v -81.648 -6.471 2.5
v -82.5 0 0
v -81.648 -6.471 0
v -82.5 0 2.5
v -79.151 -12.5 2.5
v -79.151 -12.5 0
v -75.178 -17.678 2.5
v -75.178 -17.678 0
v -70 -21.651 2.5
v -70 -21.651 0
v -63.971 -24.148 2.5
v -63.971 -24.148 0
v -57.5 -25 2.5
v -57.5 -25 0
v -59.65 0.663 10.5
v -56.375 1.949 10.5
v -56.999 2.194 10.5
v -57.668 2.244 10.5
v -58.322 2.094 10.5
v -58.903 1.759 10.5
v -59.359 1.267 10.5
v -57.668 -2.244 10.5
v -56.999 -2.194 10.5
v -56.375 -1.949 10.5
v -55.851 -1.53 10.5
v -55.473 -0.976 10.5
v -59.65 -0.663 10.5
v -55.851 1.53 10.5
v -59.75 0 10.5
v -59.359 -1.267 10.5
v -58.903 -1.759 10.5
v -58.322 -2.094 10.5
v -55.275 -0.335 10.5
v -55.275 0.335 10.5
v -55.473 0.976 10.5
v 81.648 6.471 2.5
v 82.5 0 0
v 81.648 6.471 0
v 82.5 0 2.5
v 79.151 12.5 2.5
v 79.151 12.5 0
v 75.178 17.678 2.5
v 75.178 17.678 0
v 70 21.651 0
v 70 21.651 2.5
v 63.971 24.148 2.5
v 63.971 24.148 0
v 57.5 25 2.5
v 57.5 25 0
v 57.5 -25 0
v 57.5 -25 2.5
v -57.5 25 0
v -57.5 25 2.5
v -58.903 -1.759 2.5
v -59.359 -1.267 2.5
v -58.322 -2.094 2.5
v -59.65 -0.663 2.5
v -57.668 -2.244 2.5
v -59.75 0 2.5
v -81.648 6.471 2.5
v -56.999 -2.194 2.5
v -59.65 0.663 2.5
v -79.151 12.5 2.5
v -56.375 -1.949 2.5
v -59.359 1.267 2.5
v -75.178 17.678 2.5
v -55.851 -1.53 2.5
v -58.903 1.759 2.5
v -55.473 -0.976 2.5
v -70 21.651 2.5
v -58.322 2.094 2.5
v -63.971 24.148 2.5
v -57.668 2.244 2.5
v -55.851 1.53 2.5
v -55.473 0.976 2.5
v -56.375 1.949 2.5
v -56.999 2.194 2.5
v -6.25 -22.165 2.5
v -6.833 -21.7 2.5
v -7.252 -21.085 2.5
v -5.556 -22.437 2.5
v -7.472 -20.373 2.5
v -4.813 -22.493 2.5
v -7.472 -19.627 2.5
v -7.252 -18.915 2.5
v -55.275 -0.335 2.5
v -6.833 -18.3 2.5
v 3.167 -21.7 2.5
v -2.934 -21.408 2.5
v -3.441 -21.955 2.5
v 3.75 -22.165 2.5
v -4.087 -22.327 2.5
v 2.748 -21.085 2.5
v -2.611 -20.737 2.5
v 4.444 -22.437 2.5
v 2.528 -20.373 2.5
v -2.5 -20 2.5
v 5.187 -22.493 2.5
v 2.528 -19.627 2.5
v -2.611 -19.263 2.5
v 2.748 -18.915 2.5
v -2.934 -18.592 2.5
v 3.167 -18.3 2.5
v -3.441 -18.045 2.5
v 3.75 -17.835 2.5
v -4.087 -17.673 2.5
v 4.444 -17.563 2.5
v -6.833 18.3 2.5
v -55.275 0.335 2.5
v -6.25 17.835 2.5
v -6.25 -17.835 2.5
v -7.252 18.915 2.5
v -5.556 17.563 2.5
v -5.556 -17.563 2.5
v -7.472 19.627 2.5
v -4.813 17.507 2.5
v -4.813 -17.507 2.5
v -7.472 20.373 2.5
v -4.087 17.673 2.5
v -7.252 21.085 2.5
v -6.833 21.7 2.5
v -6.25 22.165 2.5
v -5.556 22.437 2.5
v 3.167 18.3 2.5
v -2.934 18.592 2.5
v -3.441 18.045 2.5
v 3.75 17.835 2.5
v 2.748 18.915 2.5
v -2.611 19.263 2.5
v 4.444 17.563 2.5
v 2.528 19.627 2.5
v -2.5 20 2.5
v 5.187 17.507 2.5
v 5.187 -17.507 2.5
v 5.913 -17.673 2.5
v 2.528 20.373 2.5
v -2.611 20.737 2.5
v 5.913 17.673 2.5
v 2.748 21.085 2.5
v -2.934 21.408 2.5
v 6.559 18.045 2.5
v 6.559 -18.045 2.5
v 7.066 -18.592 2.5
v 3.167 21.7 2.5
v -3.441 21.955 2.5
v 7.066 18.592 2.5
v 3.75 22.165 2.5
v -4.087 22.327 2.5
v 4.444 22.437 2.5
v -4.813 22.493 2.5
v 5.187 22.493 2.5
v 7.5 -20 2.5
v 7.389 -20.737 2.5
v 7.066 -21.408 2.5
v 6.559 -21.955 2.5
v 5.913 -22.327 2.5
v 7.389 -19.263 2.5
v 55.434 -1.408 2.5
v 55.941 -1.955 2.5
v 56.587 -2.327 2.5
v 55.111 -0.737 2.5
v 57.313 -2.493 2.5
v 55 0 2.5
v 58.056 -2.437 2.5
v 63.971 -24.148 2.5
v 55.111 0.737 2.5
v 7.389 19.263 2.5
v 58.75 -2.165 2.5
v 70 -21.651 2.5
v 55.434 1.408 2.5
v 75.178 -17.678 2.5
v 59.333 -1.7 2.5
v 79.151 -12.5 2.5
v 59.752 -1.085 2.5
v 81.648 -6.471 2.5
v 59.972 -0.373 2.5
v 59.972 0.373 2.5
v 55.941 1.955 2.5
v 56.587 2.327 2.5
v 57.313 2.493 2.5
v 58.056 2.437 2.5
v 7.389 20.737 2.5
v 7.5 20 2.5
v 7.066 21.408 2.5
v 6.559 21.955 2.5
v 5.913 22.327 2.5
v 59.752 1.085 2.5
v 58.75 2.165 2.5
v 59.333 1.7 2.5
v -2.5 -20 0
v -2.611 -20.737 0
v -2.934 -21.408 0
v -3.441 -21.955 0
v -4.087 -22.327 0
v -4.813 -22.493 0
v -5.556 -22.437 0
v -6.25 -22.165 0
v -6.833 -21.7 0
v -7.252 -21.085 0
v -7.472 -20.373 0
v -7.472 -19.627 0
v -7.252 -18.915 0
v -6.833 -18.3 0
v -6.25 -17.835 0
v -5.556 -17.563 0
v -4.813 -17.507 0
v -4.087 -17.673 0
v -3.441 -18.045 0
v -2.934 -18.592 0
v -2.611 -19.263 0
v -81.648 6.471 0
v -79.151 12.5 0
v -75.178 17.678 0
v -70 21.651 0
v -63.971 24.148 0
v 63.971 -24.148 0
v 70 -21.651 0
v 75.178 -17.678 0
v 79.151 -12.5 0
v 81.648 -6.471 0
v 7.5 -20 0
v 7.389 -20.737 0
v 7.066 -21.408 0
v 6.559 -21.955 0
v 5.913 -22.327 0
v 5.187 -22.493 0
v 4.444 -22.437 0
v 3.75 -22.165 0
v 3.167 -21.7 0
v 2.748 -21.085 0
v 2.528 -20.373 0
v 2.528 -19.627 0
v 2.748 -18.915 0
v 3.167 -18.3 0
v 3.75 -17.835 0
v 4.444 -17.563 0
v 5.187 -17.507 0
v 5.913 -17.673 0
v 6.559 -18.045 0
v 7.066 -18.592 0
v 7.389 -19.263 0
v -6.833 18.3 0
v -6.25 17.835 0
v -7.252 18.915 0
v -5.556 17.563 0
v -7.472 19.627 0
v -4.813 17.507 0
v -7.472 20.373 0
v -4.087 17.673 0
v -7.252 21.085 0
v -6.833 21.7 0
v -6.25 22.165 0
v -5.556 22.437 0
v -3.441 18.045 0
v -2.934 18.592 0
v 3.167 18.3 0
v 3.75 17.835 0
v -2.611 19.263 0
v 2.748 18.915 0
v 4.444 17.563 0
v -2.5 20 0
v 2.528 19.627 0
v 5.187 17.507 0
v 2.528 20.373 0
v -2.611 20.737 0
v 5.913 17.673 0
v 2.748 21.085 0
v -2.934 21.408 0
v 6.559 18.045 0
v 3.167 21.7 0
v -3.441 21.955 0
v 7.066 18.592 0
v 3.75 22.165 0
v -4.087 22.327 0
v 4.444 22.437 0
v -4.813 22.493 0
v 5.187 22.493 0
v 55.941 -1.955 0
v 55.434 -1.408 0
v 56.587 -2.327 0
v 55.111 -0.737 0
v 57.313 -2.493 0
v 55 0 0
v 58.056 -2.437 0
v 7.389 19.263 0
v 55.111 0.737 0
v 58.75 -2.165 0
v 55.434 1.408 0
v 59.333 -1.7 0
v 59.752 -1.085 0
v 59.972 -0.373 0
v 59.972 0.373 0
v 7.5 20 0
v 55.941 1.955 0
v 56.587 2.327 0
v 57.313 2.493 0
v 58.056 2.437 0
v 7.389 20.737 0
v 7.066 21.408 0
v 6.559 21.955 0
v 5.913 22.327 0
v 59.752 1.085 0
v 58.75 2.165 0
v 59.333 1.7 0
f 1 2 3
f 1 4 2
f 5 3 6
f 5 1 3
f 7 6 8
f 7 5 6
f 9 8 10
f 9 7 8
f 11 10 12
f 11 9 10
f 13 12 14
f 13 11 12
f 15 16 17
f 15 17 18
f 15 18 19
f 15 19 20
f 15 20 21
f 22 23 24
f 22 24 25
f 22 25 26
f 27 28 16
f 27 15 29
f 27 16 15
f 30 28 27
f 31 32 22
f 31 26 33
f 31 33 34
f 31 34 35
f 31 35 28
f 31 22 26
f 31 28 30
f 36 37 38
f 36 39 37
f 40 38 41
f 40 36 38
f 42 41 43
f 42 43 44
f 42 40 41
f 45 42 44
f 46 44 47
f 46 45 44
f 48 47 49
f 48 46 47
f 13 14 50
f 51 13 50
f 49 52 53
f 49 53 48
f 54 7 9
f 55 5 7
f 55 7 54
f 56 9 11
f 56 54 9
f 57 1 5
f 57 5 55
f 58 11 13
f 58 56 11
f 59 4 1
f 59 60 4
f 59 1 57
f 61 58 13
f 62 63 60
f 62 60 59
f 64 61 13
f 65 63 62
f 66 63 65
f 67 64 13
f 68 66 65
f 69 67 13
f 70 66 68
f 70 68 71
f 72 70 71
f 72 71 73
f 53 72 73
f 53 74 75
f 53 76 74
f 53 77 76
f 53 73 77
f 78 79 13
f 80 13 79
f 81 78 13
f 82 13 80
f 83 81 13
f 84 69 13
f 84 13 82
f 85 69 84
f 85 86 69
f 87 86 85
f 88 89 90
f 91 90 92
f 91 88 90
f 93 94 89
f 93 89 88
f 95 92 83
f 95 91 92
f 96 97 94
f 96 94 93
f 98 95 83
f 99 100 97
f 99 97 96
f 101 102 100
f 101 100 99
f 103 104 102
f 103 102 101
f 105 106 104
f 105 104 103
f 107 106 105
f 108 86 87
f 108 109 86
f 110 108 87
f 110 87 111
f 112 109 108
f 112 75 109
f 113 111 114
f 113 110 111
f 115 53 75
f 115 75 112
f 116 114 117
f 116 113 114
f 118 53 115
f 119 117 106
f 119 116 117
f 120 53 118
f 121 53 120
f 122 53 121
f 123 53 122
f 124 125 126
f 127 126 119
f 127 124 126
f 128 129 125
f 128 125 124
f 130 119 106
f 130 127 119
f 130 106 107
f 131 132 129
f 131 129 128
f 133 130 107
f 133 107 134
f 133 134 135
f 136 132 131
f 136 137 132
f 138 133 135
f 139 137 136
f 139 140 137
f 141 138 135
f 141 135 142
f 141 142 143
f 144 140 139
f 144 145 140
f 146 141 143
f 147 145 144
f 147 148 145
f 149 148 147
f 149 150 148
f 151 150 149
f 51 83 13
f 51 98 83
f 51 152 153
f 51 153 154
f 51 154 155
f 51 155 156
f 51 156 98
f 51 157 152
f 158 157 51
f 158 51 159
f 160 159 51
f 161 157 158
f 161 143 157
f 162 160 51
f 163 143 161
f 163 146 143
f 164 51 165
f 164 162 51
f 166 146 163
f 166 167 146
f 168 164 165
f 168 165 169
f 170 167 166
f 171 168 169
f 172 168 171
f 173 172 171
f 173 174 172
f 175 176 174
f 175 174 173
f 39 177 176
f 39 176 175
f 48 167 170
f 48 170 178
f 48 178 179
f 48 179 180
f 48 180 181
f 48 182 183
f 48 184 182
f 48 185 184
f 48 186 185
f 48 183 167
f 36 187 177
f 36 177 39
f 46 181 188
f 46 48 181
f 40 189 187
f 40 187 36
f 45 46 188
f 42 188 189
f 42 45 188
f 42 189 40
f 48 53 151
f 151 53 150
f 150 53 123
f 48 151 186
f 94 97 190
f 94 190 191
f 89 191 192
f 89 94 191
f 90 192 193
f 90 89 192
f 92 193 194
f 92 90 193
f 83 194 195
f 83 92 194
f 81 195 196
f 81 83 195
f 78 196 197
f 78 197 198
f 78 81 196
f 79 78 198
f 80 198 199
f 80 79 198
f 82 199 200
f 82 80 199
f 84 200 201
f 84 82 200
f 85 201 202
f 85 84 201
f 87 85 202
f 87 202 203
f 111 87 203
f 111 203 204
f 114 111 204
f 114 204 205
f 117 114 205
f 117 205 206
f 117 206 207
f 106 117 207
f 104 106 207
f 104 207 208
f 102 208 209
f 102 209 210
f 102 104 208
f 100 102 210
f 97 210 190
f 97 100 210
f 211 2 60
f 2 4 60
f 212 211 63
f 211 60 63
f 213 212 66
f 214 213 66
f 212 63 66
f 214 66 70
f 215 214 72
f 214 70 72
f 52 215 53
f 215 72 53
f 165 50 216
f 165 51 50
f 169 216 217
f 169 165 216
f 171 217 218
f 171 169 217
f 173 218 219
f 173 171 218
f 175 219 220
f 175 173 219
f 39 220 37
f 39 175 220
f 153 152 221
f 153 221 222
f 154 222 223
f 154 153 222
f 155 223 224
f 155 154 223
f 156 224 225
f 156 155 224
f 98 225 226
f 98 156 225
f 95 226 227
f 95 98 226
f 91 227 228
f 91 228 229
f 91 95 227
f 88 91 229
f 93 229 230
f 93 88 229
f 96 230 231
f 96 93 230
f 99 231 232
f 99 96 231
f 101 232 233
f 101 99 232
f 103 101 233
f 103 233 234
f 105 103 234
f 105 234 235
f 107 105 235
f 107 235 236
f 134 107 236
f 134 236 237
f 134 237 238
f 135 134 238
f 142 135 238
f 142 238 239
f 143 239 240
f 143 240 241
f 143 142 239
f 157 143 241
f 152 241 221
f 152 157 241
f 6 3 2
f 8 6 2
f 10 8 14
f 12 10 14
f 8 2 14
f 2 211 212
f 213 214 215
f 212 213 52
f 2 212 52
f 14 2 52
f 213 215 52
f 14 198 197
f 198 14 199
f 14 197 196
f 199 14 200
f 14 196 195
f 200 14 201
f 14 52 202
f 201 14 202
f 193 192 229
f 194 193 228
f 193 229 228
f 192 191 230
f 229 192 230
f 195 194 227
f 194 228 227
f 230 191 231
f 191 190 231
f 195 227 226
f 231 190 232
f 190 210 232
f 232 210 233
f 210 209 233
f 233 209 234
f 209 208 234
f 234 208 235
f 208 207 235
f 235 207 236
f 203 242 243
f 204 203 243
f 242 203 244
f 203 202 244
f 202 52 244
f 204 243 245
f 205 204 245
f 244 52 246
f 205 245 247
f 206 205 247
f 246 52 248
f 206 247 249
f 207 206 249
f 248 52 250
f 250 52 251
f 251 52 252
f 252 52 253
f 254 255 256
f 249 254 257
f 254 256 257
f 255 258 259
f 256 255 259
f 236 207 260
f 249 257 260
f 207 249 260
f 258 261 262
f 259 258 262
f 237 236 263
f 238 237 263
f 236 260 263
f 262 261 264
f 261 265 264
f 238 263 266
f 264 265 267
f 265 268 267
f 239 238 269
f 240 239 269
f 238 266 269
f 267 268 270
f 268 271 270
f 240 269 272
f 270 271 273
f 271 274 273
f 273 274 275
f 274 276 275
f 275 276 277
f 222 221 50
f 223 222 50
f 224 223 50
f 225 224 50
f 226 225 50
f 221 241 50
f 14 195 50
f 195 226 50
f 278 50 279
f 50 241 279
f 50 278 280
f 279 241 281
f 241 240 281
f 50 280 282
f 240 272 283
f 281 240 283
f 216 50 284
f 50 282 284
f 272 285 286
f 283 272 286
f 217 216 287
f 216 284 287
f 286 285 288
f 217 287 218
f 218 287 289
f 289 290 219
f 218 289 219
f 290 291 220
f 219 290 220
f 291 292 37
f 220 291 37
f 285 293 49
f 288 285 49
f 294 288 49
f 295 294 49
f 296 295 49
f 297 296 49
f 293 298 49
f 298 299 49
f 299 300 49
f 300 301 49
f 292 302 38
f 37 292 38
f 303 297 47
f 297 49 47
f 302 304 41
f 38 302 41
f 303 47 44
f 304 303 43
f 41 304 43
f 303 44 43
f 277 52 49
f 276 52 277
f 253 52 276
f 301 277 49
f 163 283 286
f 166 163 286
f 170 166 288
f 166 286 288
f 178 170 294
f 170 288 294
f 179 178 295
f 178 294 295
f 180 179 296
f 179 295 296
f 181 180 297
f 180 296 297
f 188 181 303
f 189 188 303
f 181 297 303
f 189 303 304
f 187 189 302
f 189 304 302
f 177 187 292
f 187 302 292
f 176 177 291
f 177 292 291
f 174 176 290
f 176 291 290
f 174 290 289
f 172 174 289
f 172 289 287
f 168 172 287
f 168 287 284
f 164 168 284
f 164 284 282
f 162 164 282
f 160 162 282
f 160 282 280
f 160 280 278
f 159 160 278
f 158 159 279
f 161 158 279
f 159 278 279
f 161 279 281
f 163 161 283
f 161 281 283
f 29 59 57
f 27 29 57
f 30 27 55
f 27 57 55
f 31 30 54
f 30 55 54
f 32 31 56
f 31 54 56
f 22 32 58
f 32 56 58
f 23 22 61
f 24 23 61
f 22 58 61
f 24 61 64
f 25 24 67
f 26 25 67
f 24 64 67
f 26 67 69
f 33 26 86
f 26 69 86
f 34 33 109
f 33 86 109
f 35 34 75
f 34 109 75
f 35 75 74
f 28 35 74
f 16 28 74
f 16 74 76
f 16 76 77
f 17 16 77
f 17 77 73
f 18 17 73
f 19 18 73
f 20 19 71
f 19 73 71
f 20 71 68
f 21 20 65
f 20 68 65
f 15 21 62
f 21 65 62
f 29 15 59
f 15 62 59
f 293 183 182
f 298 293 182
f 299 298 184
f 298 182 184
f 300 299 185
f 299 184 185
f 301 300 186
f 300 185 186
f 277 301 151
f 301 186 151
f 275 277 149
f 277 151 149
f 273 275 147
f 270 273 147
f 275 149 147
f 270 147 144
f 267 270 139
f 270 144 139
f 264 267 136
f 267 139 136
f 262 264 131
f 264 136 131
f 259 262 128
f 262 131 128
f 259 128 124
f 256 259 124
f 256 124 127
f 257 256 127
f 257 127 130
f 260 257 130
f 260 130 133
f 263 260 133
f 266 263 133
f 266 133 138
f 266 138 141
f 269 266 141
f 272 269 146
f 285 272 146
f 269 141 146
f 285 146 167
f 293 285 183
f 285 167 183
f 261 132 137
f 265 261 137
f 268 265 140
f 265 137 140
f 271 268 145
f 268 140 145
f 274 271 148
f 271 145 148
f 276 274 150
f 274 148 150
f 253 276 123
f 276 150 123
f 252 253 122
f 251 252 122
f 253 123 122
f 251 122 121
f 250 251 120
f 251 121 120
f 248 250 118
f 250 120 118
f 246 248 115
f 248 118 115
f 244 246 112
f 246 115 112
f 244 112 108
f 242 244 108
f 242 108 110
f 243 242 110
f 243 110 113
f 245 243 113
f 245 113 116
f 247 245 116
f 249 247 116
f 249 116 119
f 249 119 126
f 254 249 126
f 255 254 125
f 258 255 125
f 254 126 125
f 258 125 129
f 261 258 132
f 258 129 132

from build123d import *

# Parameters (mm, degrees)
SKETCH1_W           = 165
SKETCH1_H           = 50
BOSS_EXTRUDE1_DEPTH = 2.5
FILLET1_R           = 25
SKETCH2_R           = 2.5
CUT_EXTRUDE1_DEPTH  = 2.5
SKETCH3_R           = 2.5
CUT_EXTRUDE2_DEPTH  = 2.5
SKETCH4_R           = 2.25
BOSS_EXTRUDE2_DEPTH = 8


with BuildPart() as part:
    # Sketch1 → Boss-Extrude1 (new body)
    with BuildSketch(Plane.XY):
        Rectangle(SKETCH1_W, SKETCH1_H)
    extrude(amount=BOSS_EXTRUDE1_DEPTH)

    # Fillet1
    fillet1_edges = [part.edges().sort_by_distance(p)[0] for p in [
        (-82.5, -25, 1.25),
        (-82.5, 25, 1.25),
        (82.5, -25, 1.25),
        (82.5, 25, 1.25),
    ]]
    fillet(fillet1_edges, radius=FILLET1_R - 0.0001)  # a hair under: the kernel refuses the full size

    # Sketch2 → Cut-Extrude1 (cut)
    with BuildSketch(Plane.XY.offset(2.5)):
        with Locations((-5, 20)):
            Circle(SKETCH2_R)
        with Locations((5, 20)):
            Circle(SKETCH2_R)
    cut_extrude1 = extrude(amount=-CUT_EXTRUDE1_DEPTH, mode=Mode.SUBTRACT)

    # Mirror1: Cut-Extrude1 across plane
    add(cut_extrude1.mirror(Plane.ZX), mode=Mode.SUBTRACT)

    # Sketch3 → Cut-Extrude2 (cut)
    with BuildSketch(Plane(origin=(0, 0, 0), x_dir=(-1, 0, 0), z_dir=(0, 0, -1))):
        with Locations((-57.5, 0)):
            Circle(SKETCH3_R)
    extrude(amount=-CUT_EXTRUDE2_DEPTH, mode=Mode.SUBTRACT)

    # Sketch4 → Boss-Extrude2 (add)
    with BuildSketch(Plane.XY.offset(2.5)):
        with Locations(Location((-57.5, 0, 0), (0, 0, 180))):
            Circle(SKETCH4_R)
    extrude(amount=BOSS_EXTRUDE2_DEPTH)


solid = part.part
